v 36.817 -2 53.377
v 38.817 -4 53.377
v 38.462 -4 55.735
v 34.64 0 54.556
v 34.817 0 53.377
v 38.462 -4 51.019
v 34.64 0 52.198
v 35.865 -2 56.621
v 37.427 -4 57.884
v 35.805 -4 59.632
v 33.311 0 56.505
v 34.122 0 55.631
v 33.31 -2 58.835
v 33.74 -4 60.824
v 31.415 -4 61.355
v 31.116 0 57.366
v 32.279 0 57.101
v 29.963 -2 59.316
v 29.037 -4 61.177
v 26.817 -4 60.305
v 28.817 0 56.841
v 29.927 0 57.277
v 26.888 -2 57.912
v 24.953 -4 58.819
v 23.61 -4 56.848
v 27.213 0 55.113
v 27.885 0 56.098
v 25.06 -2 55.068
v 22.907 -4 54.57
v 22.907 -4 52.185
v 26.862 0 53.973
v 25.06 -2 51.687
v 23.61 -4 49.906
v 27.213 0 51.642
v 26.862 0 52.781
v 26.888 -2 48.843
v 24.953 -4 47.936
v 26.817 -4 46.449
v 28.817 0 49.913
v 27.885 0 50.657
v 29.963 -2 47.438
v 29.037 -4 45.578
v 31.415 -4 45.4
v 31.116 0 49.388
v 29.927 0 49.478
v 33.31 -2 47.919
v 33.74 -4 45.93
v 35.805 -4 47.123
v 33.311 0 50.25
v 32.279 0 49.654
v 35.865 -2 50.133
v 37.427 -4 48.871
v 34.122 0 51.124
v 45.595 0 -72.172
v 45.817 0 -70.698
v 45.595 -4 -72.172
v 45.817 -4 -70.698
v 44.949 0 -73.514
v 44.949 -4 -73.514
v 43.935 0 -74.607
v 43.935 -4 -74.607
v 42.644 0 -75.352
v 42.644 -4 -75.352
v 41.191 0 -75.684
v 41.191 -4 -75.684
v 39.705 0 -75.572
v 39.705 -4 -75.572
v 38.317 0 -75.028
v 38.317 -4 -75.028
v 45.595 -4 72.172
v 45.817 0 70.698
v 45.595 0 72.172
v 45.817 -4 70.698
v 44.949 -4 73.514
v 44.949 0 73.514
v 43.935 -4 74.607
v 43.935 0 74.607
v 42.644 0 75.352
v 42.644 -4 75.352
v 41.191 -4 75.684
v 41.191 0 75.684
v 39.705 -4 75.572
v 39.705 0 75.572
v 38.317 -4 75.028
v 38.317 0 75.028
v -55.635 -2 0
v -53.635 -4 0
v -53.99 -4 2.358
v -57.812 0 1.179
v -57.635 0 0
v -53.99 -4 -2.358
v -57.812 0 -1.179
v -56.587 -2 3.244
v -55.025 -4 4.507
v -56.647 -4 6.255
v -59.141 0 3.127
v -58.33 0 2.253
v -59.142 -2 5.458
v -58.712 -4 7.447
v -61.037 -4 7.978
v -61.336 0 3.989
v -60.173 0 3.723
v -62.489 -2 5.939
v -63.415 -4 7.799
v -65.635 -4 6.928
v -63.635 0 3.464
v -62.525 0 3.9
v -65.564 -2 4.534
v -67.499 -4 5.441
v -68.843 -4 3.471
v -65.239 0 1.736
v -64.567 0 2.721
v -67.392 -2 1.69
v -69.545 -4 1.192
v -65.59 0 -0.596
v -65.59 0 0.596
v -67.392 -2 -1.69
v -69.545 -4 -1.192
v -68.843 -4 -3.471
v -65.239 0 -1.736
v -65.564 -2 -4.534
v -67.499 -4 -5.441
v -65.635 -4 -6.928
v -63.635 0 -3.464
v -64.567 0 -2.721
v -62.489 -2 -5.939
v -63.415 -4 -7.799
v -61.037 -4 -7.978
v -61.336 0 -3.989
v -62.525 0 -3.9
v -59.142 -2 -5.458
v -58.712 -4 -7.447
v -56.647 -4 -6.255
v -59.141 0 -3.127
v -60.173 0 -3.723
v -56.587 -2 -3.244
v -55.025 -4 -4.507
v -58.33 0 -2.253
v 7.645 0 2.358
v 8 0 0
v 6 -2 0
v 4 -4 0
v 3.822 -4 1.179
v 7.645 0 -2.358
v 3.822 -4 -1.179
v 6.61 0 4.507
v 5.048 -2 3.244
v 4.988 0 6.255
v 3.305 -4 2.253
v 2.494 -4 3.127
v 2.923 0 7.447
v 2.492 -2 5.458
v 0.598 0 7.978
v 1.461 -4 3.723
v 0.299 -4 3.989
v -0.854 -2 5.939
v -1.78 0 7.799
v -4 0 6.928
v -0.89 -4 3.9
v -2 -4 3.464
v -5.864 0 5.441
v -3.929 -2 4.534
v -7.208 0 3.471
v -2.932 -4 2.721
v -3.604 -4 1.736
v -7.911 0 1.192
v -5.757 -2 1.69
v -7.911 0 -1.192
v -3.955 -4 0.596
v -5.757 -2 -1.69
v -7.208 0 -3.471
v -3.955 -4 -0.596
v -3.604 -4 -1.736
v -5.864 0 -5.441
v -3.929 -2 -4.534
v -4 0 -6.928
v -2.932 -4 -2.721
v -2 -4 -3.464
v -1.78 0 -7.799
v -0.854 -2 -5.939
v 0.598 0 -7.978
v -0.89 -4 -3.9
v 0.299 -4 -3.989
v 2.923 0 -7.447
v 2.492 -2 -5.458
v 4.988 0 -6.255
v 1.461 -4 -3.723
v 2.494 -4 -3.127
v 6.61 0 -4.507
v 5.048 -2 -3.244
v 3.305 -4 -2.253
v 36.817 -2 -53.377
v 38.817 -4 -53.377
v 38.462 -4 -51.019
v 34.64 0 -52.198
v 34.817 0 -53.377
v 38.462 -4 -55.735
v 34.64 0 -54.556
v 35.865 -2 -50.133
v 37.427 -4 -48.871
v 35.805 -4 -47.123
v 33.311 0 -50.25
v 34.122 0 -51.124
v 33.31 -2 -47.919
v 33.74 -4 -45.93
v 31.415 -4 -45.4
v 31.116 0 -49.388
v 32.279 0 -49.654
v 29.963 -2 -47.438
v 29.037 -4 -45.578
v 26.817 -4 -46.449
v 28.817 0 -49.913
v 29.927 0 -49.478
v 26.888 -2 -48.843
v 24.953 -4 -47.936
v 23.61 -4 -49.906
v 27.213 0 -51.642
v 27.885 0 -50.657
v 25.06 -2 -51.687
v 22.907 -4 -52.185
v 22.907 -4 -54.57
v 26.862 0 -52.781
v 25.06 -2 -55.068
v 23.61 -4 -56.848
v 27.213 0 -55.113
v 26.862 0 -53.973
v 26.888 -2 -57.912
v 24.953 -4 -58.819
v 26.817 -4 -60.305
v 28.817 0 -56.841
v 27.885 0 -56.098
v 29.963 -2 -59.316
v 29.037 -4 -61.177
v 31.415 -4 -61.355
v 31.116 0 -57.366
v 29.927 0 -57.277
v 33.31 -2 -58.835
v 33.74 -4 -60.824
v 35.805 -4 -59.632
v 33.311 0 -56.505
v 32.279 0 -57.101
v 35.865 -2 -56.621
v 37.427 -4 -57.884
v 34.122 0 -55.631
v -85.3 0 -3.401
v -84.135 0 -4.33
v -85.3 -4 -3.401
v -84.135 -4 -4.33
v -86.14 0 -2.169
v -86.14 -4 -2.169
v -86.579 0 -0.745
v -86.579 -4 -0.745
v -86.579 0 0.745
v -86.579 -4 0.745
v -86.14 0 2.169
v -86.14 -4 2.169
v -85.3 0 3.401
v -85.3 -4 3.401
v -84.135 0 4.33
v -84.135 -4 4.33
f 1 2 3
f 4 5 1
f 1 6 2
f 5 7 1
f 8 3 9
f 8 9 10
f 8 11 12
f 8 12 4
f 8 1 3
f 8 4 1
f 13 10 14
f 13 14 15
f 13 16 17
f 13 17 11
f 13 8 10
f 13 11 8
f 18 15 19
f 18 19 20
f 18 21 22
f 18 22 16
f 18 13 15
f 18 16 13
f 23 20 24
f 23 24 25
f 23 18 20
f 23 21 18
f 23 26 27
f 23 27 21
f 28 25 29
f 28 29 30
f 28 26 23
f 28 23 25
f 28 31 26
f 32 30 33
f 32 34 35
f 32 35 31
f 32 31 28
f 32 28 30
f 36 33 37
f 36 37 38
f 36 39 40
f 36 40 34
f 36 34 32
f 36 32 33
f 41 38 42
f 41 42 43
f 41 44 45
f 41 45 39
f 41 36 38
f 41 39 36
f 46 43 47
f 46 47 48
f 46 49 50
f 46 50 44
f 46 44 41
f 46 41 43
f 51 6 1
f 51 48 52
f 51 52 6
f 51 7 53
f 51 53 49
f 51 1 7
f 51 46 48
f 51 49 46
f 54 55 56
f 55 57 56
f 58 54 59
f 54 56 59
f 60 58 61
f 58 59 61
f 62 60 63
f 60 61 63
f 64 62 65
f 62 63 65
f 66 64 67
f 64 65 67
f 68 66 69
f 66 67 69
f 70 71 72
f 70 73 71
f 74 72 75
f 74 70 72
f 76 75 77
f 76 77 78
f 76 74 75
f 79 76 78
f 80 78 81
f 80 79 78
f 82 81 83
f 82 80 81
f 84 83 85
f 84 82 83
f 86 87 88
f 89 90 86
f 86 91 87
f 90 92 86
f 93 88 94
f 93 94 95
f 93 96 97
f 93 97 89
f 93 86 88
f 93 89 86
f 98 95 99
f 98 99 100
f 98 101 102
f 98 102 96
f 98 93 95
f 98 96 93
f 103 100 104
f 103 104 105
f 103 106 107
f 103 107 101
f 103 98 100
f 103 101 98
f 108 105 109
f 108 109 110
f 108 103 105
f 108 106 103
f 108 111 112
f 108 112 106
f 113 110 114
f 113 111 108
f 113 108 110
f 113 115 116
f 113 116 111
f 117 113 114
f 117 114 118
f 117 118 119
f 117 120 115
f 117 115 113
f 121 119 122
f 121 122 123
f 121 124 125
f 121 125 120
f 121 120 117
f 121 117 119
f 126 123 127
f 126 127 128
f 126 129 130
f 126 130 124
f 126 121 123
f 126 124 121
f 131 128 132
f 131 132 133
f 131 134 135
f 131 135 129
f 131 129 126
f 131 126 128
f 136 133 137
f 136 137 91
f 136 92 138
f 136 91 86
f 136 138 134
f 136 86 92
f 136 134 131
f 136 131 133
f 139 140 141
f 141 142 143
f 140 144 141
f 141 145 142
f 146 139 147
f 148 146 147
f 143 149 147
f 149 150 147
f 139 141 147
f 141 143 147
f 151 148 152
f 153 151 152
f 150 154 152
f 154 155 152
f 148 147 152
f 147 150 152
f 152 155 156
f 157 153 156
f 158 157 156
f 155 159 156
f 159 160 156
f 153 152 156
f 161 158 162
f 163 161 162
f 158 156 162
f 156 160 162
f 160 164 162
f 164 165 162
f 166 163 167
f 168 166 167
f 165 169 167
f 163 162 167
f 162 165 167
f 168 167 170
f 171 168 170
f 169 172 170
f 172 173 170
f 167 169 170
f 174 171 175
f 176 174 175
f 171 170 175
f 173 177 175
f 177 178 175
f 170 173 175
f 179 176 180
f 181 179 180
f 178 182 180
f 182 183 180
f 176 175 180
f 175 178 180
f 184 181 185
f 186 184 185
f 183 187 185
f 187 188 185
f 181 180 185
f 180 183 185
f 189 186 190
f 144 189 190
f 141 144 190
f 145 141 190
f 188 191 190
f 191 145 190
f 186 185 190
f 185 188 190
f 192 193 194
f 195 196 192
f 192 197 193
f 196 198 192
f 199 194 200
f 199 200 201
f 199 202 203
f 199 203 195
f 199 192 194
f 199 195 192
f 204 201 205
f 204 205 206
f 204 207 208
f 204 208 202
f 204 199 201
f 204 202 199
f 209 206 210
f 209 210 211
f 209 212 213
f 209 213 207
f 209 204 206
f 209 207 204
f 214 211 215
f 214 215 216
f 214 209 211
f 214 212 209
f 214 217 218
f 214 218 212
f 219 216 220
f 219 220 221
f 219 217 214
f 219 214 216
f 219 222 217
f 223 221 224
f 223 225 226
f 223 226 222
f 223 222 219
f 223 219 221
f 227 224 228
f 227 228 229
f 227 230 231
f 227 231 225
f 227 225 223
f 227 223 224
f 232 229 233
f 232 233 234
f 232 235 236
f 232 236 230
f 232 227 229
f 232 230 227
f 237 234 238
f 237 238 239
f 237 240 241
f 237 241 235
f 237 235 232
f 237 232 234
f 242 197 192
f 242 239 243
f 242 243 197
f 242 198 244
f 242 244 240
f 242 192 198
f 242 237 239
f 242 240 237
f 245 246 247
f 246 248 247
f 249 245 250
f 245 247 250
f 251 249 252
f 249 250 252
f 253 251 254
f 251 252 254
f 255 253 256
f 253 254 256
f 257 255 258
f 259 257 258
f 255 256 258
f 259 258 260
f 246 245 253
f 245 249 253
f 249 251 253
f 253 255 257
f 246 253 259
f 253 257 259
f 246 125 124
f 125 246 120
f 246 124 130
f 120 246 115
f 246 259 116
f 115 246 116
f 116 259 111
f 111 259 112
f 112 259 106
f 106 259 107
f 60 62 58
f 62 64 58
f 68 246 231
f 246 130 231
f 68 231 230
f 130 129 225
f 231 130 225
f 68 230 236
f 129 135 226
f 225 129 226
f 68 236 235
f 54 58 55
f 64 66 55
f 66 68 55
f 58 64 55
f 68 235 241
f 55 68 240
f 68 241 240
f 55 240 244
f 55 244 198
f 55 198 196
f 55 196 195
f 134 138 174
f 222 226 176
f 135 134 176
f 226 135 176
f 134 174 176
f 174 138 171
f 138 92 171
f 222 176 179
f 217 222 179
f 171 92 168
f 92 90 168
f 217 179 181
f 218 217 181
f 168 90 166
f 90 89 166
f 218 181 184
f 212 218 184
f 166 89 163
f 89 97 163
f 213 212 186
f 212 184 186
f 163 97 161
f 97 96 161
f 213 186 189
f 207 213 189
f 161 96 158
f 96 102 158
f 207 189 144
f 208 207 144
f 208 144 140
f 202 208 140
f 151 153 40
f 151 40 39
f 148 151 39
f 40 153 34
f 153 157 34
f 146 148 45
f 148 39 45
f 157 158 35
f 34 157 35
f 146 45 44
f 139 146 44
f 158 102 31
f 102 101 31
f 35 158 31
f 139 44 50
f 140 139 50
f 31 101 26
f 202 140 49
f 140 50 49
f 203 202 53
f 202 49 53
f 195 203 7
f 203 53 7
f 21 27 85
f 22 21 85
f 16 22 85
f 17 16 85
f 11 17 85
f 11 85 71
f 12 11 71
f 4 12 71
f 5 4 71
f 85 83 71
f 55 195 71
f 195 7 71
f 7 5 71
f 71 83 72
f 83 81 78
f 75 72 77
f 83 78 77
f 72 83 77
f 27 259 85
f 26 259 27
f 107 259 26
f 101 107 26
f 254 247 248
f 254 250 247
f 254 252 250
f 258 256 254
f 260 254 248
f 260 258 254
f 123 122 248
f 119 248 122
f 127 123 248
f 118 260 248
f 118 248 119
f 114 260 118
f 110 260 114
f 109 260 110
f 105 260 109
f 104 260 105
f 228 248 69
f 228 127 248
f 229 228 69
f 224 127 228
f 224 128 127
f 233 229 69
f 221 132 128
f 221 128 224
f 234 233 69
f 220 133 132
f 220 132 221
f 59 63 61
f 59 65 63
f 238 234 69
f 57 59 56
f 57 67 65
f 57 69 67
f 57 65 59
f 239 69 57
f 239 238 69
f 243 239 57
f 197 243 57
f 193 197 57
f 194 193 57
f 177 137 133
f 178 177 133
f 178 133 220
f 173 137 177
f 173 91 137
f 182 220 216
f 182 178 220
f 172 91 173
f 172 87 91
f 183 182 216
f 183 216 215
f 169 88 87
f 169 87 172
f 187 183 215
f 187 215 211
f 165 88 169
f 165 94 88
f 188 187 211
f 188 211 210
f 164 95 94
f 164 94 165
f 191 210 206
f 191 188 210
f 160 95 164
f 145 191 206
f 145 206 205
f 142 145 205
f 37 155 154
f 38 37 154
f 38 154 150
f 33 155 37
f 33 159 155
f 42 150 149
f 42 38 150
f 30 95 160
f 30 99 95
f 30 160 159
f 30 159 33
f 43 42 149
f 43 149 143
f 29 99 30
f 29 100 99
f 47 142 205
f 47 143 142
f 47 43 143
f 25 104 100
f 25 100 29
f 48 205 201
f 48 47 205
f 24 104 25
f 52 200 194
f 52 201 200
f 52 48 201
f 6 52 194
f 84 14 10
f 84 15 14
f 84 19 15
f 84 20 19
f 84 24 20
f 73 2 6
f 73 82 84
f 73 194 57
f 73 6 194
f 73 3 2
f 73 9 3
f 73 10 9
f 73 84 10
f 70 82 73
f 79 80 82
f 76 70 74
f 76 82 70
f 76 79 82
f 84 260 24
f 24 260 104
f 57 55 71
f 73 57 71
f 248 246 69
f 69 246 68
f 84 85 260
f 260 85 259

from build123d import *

# Parameters (mm, degrees)
F0_R     = 3
F1_DEPTH = 4
F2_R     = 5


# Not quite as in the source:
# - a fillet or chamfer that OpenCascade refuses, or shapes differently, is made with other operations: its cross-section is extruded or revolved along the edge and cut away or added


with BuildPart() as f1:
    # F0 (on Front) → F1 (new body)
    with BuildSketch(Plane.XZ):
        Polygon((45.8173750394, -79.3580214376), (45.8173750394, 79.3580214376), (-91.6347500787, 0), align=None)
        with Locations((30.8173750394, -53.3772593241)):
            Circle(F0_R, mode=Mode.SUBTRACT)
        with Locations((-61.6347500787, 0)):
            Circle(F0_R, mode=Mode.SUBTRACT)
        Circle(F0_R, mode=Mode.SUBTRACT)
        with Locations((30.8173750394, 53.3772593241)):
            Circle(F0_R, mode=Mode.SUBTRACT)
    extrude(amount=F1_DEPTH)

    # F2
    f2_edges = [f1.edges().sort_by_distance(p)[0] for p in [
        (45.817375, -2, 79.358021),
        (45.817375, -2, -79.358021),
        (-91.63475, -2, 0),
    ]]
    fillet(f2_edges, radius=F2_R)

    # F3: chamfer of 5 on 4 edges, made by hand

    # F3_s1 → F3_t2 (revolve, cut)
    with BuildSketch(Plane.XY):
        Polygon((8, 0), (3, -5), (3, 0), align=None)
    revolve(axis=Axis((0, 0, 0), (0, -1, 0)), mode=Mode.SUBTRACT)

    # F3_s3 → F3_t4 (revolve, cut)
    with BuildSketch(Plane.XY):
        Polygon((-53.6347500787, -4), (-58.6347500787, 1), (-58.6347500787, -4), align=None)
    revolve(axis=Axis((-61.6347500787, -4, 0), (0, -1, 0)), mode=Mode.SUBTRACT)

    # F3_s5 → F3_t6 (revolve, cut)
    with BuildSketch(Plane.XY.offset(53.3772593241)):
        Polygon((38.8173750394, -4), (33.8173750394, 1), (33.8173750394, -4), align=None)
    revolve(axis=Axis((30.8173750394, -4, 53.3772593241), (0, -1, 0)), mode=Mode.SUBTRACT)

    # F3_s7 → F3_t8 (revolve, cut)
    with BuildSketch(Plane.XY.offset(-53.3772593241)):
        Polygon((38.8173750394, -4), (33.8173750394, 1), (33.8173750394, -4), align=None)
    revolve(axis=Axis((30.8173750394, -4, -53.3772593241), (0, -1, 0)), mode=Mode.SUBTRACT)


solid = f1.part
